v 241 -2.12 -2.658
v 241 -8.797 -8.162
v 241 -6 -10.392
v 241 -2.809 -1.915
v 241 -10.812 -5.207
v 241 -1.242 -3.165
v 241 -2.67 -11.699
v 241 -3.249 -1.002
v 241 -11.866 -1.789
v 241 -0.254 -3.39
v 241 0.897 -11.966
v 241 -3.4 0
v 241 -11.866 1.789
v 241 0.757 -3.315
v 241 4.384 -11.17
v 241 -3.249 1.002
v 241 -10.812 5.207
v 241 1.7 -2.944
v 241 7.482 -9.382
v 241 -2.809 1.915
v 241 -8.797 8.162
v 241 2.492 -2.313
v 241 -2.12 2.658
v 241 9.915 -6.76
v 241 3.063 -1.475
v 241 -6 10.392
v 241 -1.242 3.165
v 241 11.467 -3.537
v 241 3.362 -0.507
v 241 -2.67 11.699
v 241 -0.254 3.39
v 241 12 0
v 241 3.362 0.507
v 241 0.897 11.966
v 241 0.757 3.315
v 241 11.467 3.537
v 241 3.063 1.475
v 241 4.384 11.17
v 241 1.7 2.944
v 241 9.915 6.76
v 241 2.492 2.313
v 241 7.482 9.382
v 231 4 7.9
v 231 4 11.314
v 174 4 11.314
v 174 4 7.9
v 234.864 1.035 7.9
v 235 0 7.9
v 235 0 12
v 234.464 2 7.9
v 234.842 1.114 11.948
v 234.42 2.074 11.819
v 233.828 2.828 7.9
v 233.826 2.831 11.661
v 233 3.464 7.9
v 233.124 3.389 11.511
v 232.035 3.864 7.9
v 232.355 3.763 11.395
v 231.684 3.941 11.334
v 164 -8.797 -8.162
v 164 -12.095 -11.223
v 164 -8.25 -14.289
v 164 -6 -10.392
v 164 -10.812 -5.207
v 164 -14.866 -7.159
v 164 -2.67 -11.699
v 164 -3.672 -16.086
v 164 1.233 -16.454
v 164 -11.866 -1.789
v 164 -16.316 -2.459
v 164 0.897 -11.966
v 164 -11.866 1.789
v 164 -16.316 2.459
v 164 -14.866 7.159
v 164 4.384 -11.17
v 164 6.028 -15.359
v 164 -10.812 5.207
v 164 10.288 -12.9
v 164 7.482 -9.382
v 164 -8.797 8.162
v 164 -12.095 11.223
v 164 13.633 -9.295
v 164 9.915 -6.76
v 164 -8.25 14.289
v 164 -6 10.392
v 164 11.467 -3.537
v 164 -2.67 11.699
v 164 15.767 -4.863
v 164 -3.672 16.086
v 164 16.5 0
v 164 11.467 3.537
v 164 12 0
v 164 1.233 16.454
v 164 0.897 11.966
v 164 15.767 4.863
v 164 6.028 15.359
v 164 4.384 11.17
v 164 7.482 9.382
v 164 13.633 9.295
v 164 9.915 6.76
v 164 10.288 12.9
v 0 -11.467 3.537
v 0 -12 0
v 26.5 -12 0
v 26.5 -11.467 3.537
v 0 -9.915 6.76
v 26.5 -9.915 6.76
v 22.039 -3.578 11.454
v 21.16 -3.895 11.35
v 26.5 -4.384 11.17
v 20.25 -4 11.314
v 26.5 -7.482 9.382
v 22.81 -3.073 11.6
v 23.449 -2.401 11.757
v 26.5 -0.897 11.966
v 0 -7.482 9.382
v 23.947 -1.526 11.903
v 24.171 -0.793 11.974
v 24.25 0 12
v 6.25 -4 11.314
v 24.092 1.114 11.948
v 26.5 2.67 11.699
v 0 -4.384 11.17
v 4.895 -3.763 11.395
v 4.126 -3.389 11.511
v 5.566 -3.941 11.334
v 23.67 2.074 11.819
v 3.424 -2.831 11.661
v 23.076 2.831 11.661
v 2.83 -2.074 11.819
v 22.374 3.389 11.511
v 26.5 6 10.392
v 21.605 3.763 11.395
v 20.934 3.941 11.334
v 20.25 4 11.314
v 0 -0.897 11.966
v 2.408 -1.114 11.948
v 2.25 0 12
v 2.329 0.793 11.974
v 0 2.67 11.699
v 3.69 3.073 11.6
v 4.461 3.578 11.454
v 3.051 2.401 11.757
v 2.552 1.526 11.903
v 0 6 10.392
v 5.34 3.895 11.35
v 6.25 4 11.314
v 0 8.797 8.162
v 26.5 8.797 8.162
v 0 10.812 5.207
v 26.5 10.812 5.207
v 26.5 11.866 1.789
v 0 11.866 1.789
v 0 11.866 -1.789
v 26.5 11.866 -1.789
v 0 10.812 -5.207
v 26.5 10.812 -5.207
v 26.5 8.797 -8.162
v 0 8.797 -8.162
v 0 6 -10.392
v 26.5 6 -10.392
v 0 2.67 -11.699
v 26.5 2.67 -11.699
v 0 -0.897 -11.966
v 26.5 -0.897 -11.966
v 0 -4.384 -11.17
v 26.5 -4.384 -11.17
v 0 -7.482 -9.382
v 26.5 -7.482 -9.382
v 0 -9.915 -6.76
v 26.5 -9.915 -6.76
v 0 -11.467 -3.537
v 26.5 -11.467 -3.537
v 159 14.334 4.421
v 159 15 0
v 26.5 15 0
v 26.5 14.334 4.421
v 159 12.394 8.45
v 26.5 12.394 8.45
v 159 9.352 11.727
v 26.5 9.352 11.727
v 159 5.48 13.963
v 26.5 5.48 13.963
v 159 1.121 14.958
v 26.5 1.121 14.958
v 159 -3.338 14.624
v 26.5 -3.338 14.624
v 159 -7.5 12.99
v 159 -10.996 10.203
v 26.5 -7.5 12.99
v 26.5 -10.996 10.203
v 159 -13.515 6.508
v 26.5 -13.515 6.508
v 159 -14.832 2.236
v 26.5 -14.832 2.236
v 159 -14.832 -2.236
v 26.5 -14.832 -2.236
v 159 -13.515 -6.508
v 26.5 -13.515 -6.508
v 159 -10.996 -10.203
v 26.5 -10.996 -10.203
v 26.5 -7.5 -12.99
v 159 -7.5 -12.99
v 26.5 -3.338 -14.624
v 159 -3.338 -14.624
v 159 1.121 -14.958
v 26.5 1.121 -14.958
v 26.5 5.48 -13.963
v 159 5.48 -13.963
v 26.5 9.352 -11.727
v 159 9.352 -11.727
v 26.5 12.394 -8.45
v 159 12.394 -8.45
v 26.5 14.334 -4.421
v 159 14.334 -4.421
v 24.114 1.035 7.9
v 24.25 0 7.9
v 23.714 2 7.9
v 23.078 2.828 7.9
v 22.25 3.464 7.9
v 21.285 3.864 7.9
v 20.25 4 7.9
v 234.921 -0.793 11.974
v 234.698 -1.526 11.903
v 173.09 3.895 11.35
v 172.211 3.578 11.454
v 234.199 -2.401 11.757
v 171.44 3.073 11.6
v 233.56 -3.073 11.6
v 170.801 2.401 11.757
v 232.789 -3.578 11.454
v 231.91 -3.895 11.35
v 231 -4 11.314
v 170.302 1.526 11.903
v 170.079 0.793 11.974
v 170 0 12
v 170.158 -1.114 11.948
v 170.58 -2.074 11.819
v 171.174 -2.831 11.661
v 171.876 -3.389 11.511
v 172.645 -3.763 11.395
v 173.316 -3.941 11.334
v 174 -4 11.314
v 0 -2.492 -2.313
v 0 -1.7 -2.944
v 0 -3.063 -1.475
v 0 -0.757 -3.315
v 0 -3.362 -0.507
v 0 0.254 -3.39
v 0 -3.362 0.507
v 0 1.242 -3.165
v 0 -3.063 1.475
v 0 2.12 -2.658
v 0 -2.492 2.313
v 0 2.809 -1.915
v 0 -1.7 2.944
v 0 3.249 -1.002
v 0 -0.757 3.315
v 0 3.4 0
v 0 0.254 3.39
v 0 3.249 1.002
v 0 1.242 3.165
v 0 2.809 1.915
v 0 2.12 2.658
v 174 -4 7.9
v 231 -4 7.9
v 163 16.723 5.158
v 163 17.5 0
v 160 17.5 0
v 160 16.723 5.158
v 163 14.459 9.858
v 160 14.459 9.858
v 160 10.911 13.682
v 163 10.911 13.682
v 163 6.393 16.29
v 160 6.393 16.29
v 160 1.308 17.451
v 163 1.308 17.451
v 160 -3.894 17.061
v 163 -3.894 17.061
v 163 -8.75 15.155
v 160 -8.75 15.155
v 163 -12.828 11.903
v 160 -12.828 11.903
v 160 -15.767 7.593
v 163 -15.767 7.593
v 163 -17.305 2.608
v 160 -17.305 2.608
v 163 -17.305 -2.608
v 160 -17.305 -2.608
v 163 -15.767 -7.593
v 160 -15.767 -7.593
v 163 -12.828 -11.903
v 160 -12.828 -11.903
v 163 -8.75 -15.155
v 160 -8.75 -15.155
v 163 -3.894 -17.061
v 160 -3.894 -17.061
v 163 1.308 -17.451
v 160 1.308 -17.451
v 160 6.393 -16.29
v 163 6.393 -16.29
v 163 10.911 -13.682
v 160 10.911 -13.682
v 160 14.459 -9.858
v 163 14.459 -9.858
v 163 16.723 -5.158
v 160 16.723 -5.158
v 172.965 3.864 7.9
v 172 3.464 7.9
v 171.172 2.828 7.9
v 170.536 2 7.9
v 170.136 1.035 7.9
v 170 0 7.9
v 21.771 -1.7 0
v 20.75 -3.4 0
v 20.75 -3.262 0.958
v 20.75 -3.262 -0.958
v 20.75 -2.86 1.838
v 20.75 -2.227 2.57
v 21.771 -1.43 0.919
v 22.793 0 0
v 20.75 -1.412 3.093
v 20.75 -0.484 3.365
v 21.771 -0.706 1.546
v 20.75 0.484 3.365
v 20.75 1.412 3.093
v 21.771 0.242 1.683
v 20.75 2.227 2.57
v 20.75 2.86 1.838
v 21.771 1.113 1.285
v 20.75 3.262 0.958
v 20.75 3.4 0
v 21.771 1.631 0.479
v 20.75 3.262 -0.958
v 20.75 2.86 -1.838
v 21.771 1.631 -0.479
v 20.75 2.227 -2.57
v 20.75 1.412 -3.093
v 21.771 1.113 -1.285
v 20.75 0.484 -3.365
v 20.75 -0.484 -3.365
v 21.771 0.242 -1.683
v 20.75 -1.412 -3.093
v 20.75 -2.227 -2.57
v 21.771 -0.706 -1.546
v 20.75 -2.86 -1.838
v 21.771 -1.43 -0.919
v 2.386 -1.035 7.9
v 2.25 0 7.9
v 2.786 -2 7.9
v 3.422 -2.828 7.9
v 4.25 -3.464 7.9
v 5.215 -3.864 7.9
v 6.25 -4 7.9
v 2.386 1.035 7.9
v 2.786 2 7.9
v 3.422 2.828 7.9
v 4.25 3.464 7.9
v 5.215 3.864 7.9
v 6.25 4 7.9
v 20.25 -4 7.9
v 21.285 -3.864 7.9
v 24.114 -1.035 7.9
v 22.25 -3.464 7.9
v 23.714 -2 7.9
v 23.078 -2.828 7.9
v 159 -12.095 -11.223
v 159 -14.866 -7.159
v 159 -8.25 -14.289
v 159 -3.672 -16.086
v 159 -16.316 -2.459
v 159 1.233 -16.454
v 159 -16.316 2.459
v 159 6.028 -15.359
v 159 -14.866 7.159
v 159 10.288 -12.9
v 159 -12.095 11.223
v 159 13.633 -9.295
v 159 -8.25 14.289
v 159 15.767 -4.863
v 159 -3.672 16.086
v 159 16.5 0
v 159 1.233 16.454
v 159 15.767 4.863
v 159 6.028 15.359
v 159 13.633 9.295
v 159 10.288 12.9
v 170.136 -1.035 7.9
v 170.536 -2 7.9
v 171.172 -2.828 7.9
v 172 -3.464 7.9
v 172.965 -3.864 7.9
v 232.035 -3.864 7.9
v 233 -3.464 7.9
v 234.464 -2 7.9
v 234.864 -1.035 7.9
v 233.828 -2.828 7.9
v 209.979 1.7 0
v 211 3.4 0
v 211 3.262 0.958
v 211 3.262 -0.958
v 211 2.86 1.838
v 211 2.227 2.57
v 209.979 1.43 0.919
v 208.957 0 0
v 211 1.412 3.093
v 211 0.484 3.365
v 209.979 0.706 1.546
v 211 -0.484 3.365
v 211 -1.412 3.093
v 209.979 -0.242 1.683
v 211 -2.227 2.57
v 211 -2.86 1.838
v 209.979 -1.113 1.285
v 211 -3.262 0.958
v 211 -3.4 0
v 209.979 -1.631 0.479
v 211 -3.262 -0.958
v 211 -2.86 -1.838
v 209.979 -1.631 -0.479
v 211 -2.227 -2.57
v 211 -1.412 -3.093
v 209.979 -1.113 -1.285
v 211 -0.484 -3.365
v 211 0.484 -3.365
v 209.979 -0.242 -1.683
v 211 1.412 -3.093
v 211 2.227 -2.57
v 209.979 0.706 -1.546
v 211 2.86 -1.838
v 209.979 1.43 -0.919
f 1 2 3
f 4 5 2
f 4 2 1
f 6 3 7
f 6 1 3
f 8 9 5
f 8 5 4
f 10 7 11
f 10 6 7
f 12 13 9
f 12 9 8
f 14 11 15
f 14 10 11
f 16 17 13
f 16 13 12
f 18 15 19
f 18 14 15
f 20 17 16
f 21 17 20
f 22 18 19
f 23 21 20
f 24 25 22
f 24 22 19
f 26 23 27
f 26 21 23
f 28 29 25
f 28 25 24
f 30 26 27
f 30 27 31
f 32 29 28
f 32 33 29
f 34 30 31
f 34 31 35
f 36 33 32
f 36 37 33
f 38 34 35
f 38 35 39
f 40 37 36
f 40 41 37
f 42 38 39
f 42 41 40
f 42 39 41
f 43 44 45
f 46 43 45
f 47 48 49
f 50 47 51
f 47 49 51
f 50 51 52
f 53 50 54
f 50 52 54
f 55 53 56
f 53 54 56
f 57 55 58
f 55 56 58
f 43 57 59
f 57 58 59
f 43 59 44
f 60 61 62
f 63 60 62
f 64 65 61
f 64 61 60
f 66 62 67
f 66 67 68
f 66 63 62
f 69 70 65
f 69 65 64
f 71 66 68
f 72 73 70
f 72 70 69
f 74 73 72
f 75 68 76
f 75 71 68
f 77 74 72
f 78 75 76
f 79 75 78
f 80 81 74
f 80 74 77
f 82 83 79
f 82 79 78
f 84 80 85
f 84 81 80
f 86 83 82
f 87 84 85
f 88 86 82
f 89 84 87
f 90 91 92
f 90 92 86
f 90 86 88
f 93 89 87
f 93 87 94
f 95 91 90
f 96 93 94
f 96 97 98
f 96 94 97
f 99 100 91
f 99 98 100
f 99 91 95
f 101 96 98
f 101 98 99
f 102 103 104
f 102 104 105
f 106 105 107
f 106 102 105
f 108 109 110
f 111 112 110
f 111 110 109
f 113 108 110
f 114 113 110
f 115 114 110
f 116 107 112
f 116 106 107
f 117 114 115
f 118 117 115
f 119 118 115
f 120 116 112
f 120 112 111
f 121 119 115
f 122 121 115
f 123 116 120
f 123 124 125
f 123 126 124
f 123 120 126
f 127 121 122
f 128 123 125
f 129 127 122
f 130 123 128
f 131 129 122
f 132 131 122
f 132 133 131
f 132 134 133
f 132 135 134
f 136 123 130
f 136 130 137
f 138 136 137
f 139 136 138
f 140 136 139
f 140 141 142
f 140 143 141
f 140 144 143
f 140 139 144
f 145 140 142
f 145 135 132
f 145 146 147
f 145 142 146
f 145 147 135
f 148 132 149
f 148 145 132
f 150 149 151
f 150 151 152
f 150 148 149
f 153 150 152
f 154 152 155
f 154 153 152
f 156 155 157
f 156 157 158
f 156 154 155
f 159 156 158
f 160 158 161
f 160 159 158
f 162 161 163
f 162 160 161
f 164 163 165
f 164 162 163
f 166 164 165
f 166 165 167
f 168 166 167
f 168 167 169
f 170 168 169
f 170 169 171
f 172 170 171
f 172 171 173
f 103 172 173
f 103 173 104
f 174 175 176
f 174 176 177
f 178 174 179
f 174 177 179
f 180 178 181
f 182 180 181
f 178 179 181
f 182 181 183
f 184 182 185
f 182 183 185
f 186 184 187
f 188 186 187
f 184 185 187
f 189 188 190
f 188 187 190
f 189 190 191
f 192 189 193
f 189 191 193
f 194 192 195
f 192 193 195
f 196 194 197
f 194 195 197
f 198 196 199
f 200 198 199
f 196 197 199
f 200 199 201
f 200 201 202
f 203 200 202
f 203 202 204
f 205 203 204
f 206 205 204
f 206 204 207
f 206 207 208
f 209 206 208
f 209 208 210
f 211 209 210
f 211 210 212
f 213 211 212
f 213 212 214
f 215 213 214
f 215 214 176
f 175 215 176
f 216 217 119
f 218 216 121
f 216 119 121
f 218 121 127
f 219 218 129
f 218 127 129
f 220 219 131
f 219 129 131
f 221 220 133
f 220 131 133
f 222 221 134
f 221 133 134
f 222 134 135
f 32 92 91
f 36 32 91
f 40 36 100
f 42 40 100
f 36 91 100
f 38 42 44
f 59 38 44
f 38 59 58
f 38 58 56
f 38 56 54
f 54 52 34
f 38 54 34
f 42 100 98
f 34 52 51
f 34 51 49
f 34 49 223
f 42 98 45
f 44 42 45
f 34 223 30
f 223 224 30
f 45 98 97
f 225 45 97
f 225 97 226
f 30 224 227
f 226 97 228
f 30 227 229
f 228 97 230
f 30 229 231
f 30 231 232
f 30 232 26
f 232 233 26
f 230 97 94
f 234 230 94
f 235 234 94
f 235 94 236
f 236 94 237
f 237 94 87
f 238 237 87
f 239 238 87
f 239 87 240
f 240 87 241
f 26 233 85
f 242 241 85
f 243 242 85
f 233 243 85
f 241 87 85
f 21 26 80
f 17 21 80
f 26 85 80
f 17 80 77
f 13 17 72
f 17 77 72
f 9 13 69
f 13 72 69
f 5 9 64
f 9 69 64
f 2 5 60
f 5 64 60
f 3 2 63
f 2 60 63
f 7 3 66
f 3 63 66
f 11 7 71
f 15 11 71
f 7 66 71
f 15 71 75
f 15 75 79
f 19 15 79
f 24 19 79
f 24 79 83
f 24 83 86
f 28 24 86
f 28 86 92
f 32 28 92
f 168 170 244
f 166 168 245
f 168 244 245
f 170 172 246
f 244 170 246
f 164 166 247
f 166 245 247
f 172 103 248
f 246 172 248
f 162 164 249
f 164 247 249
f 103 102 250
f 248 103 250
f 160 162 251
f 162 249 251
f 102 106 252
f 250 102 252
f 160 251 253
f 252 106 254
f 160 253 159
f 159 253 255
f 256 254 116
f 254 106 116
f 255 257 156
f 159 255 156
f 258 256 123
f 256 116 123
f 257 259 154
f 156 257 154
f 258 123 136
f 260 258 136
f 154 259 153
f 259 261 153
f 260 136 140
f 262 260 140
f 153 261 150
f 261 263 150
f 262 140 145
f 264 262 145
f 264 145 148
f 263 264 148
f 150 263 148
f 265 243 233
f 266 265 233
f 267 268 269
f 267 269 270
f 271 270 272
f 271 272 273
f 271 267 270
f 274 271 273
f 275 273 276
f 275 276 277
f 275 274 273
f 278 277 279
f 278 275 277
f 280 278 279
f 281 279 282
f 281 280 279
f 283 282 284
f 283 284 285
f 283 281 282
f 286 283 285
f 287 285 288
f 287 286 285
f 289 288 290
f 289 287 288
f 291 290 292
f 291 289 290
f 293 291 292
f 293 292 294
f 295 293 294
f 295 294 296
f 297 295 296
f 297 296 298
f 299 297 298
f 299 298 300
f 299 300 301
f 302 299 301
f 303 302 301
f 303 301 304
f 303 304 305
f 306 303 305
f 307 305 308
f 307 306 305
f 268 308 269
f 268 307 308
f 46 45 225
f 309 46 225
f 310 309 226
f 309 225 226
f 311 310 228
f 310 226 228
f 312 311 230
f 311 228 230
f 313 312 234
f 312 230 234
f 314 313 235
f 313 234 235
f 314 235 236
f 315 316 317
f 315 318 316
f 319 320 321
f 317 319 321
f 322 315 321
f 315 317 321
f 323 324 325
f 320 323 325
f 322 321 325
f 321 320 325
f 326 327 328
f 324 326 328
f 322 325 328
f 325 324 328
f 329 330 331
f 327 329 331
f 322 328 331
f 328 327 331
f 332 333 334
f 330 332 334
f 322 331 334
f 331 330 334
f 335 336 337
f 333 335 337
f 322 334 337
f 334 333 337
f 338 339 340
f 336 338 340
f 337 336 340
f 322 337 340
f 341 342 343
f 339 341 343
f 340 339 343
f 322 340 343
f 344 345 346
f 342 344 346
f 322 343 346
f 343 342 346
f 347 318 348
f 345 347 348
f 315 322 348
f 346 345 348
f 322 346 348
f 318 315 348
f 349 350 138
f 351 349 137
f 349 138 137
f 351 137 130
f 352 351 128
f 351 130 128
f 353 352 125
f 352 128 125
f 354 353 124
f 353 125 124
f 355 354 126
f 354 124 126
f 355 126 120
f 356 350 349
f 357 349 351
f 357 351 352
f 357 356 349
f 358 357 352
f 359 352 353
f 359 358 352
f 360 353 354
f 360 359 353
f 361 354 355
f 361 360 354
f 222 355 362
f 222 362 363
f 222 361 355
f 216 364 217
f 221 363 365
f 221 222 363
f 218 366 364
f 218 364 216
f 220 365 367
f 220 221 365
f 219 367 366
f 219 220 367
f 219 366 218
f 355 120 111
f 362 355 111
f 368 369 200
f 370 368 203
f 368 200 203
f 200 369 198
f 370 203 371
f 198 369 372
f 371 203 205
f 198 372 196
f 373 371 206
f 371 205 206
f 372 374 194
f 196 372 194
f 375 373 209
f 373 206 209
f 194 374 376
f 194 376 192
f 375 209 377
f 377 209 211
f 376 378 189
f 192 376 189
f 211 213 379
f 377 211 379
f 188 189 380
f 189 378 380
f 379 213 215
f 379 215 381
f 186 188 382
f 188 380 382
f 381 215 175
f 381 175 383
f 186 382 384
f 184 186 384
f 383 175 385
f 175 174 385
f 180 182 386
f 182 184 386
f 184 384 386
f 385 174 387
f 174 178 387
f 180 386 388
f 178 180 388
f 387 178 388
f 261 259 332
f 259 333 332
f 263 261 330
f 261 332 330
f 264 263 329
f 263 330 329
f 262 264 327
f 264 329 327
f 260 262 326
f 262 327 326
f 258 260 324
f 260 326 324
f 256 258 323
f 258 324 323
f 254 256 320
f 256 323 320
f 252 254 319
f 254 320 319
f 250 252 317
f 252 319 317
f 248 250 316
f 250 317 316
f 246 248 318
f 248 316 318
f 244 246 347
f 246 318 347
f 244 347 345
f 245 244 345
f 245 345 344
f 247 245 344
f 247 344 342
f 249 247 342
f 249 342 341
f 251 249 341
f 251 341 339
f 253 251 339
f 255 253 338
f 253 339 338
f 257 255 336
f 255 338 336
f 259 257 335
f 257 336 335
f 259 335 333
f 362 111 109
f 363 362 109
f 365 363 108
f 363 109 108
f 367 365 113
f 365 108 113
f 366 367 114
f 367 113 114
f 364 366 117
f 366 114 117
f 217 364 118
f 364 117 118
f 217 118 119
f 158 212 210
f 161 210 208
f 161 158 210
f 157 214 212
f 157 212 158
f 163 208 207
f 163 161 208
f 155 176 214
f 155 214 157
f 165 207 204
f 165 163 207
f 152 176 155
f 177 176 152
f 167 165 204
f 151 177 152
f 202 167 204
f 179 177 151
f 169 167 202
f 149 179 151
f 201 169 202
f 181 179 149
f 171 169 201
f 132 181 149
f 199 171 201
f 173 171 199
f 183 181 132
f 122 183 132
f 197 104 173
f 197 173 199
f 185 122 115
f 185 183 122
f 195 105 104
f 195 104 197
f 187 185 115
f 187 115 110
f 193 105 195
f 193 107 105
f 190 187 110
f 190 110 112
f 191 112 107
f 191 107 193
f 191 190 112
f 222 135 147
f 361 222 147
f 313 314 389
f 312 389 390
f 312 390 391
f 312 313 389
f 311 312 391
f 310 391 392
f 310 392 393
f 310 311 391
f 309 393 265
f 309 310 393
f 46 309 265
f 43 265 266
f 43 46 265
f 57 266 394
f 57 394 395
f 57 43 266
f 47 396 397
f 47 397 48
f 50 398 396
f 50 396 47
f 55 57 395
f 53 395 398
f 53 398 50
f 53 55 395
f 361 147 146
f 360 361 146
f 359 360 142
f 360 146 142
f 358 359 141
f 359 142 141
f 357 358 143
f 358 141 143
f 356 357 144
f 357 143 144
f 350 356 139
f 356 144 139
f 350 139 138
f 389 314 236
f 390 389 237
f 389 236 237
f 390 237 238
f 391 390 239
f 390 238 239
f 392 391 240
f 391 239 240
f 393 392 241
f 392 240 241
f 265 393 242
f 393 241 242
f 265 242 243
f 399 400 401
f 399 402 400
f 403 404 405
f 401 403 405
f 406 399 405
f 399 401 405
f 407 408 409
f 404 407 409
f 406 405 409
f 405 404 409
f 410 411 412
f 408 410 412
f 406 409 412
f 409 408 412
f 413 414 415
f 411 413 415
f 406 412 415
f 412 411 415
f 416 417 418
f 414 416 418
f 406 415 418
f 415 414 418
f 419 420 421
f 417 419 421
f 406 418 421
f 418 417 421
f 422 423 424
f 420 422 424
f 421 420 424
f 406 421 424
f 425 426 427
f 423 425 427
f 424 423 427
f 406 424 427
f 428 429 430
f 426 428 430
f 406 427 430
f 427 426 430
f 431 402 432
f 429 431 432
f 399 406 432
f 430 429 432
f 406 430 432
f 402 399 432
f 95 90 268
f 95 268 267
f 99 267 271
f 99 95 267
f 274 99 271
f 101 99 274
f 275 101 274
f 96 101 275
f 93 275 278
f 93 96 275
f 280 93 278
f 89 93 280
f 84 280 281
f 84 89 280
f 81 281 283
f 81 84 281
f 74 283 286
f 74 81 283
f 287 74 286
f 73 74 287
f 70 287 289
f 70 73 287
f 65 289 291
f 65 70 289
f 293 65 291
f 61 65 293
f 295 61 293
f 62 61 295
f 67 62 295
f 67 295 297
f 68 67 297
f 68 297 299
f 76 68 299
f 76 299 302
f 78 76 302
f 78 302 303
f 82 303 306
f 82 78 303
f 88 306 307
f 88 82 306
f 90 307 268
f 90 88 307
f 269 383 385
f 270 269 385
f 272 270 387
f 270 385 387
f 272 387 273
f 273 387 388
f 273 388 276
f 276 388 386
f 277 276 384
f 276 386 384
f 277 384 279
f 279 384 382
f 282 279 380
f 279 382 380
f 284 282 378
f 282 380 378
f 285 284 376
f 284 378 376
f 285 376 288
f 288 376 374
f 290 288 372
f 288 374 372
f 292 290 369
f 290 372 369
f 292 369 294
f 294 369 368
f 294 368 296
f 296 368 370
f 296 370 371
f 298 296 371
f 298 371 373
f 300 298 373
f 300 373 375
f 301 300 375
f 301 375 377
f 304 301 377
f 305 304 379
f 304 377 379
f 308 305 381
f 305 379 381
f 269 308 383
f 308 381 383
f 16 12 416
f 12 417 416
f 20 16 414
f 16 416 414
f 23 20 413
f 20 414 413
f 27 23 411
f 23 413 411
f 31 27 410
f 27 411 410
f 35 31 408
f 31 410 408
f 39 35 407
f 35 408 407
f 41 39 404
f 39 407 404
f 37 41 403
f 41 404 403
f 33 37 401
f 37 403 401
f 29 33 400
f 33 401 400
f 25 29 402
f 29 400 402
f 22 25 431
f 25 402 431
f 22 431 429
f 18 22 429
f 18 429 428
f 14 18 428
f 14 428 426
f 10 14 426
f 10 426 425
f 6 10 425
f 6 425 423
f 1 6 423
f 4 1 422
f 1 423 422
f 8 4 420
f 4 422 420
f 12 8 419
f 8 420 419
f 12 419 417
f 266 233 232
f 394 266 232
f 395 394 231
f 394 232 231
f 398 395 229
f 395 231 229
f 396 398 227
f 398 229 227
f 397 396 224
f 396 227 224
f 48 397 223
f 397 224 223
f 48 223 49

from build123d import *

# Parameters (mm, degrees)
F0_R      = 15
F1_DEPTH  = 164
F2_R      = 12
F3_DEPTH  = 77
F5_D      = 6.8
F5_DEPTH  = 30
F5_TIP    = 2.0429261047
F8_DEPTH  = 4.1
F9_R      = 17.5
F9_R_2    = 15
F10_DEPTH = 5
F11_SIZE  = 1
F12_R     = 15
F12_R_2   = 12
F13_DEPTH = 26.5
F14_D     = 6.8
F14_DEPTH = 20.75
F14_TIP   = 2.0429261047
F16_DEPTH = 4.1


# Not quite as in the source:
# - a feature names something its author has since deleted; it is built from what else it names


with BuildPart() as f1:
    # F0 (on Right) → F1 (new body)
    with BuildSketch(Plane.YZ):
        Circle(F0_R)
    extrude(amount=F1_DEPTH)

    # F2 (on face) → F3 (join)
    with BuildSketch(Plane.YZ.offset(164)):
        Circle(F2_R)
    extrude(amount=F3_DEPTH)

    # F5
    with Locations(Plane.YZ.offset(241)):
        with Locations((0, 0)):
            Hole(F5_D / 2, depth=F5_DEPTH)
            with Locations((0, 0, -(F5_DEPTH + F5_TIP / 2))):  # 118° drill point
                Cone(0, F5_D / 2, F5_TIP, mode=Mode.SUBTRACT)

    # F7 (on offset) → F8 (cut)
    with BuildSketch(Plane.XY.offset(12)):
        with BuildLine():
            ThreePointArc((170, 0), (171.1715728753, -2.8284271247), (174, -4))
            Line((174, -4), (231, -4))
            ThreePointArc((231, -4), (233.8284271247, -2.8284271247), (235, 0))
            ThreePointArc((235, 0), (233.8284271247, 2.8284271247), (231, 4))
            Line((231, 4), (174, 4))
            ThreePointArc((174, 4), (171.1715728753, 2.8284271247), (170, 0))
        make_face()
    extrude(amount=-F8_DEPTH, mode=Mode.SUBTRACT)

    # F9 (on face) → F10 (join)
    with BuildSketch(Plane.YZ.offset(164)):
        Circle(F9_R)
        Circle(F9_R_2, mode=Mode.SUBTRACT)
    extrude(amount=-F10_DEPTH)

    # F11
    f11_edges = [f1.edges().sort_by_distance(p)[0] for p in [
        (164, -17.5, 0),
        (159, -17.5, 0),
    ]]
    chamfer(f11_edges, length=F11_SIZE)

    # F12 (on face) → F13 (cut)
    with BuildSketch(Plane(origin=(0, 0, 0), x_dir=(0, -1, 0), z_dir=(-1, 0, 0))):
        Circle(F12_R)
        Circle(F12_R_2, mode=Mode.SUBTRACT)
    extrude(amount=-F13_DEPTH, mode=Mode.SUBTRACT)

    # F14
    with Locations(Plane(origin=(0, 0, 0), x_dir=(0, -1, 0), z_dir=(-1, 0, 0))):
        with Locations((0, 0)):
            Hole(F14_D / 2, depth=F14_DEPTH)
            with Locations((0, 0, -(F14_DEPTH + F14_TIP / 2))):  # 118° drill point
                Cone(0, F14_D / 2, F14_TIP, mode=Mode.SUBTRACT)

    # F15 (on offset) → F16 (cut)
    with BuildSketch(Plane.XY.offset(12)):
        with BuildLine():
            Line((6.25, -4), (20.25, -4))
            ThreePointArc((20.25, -4), (23.0784271247, -2.8284271247), (24.25, 0))
            ThreePointArc((24.25, 0), (23.0784271247, 2.8284271247), (20.25, 4))
            Line((20.25, 4), (6.25, 4))
            ThreePointArc((6.25, 4), (3.4215728753, 2.8284271247), (2.25, 0))
            ThreePointArc((2.25, 0), (3.4215728753, -2.8284271247), (6.25, -4))
        make_face()
    extrude(amount=-F16_DEPTH, mode=Mode.SUBTRACT)


solid = f1.part
